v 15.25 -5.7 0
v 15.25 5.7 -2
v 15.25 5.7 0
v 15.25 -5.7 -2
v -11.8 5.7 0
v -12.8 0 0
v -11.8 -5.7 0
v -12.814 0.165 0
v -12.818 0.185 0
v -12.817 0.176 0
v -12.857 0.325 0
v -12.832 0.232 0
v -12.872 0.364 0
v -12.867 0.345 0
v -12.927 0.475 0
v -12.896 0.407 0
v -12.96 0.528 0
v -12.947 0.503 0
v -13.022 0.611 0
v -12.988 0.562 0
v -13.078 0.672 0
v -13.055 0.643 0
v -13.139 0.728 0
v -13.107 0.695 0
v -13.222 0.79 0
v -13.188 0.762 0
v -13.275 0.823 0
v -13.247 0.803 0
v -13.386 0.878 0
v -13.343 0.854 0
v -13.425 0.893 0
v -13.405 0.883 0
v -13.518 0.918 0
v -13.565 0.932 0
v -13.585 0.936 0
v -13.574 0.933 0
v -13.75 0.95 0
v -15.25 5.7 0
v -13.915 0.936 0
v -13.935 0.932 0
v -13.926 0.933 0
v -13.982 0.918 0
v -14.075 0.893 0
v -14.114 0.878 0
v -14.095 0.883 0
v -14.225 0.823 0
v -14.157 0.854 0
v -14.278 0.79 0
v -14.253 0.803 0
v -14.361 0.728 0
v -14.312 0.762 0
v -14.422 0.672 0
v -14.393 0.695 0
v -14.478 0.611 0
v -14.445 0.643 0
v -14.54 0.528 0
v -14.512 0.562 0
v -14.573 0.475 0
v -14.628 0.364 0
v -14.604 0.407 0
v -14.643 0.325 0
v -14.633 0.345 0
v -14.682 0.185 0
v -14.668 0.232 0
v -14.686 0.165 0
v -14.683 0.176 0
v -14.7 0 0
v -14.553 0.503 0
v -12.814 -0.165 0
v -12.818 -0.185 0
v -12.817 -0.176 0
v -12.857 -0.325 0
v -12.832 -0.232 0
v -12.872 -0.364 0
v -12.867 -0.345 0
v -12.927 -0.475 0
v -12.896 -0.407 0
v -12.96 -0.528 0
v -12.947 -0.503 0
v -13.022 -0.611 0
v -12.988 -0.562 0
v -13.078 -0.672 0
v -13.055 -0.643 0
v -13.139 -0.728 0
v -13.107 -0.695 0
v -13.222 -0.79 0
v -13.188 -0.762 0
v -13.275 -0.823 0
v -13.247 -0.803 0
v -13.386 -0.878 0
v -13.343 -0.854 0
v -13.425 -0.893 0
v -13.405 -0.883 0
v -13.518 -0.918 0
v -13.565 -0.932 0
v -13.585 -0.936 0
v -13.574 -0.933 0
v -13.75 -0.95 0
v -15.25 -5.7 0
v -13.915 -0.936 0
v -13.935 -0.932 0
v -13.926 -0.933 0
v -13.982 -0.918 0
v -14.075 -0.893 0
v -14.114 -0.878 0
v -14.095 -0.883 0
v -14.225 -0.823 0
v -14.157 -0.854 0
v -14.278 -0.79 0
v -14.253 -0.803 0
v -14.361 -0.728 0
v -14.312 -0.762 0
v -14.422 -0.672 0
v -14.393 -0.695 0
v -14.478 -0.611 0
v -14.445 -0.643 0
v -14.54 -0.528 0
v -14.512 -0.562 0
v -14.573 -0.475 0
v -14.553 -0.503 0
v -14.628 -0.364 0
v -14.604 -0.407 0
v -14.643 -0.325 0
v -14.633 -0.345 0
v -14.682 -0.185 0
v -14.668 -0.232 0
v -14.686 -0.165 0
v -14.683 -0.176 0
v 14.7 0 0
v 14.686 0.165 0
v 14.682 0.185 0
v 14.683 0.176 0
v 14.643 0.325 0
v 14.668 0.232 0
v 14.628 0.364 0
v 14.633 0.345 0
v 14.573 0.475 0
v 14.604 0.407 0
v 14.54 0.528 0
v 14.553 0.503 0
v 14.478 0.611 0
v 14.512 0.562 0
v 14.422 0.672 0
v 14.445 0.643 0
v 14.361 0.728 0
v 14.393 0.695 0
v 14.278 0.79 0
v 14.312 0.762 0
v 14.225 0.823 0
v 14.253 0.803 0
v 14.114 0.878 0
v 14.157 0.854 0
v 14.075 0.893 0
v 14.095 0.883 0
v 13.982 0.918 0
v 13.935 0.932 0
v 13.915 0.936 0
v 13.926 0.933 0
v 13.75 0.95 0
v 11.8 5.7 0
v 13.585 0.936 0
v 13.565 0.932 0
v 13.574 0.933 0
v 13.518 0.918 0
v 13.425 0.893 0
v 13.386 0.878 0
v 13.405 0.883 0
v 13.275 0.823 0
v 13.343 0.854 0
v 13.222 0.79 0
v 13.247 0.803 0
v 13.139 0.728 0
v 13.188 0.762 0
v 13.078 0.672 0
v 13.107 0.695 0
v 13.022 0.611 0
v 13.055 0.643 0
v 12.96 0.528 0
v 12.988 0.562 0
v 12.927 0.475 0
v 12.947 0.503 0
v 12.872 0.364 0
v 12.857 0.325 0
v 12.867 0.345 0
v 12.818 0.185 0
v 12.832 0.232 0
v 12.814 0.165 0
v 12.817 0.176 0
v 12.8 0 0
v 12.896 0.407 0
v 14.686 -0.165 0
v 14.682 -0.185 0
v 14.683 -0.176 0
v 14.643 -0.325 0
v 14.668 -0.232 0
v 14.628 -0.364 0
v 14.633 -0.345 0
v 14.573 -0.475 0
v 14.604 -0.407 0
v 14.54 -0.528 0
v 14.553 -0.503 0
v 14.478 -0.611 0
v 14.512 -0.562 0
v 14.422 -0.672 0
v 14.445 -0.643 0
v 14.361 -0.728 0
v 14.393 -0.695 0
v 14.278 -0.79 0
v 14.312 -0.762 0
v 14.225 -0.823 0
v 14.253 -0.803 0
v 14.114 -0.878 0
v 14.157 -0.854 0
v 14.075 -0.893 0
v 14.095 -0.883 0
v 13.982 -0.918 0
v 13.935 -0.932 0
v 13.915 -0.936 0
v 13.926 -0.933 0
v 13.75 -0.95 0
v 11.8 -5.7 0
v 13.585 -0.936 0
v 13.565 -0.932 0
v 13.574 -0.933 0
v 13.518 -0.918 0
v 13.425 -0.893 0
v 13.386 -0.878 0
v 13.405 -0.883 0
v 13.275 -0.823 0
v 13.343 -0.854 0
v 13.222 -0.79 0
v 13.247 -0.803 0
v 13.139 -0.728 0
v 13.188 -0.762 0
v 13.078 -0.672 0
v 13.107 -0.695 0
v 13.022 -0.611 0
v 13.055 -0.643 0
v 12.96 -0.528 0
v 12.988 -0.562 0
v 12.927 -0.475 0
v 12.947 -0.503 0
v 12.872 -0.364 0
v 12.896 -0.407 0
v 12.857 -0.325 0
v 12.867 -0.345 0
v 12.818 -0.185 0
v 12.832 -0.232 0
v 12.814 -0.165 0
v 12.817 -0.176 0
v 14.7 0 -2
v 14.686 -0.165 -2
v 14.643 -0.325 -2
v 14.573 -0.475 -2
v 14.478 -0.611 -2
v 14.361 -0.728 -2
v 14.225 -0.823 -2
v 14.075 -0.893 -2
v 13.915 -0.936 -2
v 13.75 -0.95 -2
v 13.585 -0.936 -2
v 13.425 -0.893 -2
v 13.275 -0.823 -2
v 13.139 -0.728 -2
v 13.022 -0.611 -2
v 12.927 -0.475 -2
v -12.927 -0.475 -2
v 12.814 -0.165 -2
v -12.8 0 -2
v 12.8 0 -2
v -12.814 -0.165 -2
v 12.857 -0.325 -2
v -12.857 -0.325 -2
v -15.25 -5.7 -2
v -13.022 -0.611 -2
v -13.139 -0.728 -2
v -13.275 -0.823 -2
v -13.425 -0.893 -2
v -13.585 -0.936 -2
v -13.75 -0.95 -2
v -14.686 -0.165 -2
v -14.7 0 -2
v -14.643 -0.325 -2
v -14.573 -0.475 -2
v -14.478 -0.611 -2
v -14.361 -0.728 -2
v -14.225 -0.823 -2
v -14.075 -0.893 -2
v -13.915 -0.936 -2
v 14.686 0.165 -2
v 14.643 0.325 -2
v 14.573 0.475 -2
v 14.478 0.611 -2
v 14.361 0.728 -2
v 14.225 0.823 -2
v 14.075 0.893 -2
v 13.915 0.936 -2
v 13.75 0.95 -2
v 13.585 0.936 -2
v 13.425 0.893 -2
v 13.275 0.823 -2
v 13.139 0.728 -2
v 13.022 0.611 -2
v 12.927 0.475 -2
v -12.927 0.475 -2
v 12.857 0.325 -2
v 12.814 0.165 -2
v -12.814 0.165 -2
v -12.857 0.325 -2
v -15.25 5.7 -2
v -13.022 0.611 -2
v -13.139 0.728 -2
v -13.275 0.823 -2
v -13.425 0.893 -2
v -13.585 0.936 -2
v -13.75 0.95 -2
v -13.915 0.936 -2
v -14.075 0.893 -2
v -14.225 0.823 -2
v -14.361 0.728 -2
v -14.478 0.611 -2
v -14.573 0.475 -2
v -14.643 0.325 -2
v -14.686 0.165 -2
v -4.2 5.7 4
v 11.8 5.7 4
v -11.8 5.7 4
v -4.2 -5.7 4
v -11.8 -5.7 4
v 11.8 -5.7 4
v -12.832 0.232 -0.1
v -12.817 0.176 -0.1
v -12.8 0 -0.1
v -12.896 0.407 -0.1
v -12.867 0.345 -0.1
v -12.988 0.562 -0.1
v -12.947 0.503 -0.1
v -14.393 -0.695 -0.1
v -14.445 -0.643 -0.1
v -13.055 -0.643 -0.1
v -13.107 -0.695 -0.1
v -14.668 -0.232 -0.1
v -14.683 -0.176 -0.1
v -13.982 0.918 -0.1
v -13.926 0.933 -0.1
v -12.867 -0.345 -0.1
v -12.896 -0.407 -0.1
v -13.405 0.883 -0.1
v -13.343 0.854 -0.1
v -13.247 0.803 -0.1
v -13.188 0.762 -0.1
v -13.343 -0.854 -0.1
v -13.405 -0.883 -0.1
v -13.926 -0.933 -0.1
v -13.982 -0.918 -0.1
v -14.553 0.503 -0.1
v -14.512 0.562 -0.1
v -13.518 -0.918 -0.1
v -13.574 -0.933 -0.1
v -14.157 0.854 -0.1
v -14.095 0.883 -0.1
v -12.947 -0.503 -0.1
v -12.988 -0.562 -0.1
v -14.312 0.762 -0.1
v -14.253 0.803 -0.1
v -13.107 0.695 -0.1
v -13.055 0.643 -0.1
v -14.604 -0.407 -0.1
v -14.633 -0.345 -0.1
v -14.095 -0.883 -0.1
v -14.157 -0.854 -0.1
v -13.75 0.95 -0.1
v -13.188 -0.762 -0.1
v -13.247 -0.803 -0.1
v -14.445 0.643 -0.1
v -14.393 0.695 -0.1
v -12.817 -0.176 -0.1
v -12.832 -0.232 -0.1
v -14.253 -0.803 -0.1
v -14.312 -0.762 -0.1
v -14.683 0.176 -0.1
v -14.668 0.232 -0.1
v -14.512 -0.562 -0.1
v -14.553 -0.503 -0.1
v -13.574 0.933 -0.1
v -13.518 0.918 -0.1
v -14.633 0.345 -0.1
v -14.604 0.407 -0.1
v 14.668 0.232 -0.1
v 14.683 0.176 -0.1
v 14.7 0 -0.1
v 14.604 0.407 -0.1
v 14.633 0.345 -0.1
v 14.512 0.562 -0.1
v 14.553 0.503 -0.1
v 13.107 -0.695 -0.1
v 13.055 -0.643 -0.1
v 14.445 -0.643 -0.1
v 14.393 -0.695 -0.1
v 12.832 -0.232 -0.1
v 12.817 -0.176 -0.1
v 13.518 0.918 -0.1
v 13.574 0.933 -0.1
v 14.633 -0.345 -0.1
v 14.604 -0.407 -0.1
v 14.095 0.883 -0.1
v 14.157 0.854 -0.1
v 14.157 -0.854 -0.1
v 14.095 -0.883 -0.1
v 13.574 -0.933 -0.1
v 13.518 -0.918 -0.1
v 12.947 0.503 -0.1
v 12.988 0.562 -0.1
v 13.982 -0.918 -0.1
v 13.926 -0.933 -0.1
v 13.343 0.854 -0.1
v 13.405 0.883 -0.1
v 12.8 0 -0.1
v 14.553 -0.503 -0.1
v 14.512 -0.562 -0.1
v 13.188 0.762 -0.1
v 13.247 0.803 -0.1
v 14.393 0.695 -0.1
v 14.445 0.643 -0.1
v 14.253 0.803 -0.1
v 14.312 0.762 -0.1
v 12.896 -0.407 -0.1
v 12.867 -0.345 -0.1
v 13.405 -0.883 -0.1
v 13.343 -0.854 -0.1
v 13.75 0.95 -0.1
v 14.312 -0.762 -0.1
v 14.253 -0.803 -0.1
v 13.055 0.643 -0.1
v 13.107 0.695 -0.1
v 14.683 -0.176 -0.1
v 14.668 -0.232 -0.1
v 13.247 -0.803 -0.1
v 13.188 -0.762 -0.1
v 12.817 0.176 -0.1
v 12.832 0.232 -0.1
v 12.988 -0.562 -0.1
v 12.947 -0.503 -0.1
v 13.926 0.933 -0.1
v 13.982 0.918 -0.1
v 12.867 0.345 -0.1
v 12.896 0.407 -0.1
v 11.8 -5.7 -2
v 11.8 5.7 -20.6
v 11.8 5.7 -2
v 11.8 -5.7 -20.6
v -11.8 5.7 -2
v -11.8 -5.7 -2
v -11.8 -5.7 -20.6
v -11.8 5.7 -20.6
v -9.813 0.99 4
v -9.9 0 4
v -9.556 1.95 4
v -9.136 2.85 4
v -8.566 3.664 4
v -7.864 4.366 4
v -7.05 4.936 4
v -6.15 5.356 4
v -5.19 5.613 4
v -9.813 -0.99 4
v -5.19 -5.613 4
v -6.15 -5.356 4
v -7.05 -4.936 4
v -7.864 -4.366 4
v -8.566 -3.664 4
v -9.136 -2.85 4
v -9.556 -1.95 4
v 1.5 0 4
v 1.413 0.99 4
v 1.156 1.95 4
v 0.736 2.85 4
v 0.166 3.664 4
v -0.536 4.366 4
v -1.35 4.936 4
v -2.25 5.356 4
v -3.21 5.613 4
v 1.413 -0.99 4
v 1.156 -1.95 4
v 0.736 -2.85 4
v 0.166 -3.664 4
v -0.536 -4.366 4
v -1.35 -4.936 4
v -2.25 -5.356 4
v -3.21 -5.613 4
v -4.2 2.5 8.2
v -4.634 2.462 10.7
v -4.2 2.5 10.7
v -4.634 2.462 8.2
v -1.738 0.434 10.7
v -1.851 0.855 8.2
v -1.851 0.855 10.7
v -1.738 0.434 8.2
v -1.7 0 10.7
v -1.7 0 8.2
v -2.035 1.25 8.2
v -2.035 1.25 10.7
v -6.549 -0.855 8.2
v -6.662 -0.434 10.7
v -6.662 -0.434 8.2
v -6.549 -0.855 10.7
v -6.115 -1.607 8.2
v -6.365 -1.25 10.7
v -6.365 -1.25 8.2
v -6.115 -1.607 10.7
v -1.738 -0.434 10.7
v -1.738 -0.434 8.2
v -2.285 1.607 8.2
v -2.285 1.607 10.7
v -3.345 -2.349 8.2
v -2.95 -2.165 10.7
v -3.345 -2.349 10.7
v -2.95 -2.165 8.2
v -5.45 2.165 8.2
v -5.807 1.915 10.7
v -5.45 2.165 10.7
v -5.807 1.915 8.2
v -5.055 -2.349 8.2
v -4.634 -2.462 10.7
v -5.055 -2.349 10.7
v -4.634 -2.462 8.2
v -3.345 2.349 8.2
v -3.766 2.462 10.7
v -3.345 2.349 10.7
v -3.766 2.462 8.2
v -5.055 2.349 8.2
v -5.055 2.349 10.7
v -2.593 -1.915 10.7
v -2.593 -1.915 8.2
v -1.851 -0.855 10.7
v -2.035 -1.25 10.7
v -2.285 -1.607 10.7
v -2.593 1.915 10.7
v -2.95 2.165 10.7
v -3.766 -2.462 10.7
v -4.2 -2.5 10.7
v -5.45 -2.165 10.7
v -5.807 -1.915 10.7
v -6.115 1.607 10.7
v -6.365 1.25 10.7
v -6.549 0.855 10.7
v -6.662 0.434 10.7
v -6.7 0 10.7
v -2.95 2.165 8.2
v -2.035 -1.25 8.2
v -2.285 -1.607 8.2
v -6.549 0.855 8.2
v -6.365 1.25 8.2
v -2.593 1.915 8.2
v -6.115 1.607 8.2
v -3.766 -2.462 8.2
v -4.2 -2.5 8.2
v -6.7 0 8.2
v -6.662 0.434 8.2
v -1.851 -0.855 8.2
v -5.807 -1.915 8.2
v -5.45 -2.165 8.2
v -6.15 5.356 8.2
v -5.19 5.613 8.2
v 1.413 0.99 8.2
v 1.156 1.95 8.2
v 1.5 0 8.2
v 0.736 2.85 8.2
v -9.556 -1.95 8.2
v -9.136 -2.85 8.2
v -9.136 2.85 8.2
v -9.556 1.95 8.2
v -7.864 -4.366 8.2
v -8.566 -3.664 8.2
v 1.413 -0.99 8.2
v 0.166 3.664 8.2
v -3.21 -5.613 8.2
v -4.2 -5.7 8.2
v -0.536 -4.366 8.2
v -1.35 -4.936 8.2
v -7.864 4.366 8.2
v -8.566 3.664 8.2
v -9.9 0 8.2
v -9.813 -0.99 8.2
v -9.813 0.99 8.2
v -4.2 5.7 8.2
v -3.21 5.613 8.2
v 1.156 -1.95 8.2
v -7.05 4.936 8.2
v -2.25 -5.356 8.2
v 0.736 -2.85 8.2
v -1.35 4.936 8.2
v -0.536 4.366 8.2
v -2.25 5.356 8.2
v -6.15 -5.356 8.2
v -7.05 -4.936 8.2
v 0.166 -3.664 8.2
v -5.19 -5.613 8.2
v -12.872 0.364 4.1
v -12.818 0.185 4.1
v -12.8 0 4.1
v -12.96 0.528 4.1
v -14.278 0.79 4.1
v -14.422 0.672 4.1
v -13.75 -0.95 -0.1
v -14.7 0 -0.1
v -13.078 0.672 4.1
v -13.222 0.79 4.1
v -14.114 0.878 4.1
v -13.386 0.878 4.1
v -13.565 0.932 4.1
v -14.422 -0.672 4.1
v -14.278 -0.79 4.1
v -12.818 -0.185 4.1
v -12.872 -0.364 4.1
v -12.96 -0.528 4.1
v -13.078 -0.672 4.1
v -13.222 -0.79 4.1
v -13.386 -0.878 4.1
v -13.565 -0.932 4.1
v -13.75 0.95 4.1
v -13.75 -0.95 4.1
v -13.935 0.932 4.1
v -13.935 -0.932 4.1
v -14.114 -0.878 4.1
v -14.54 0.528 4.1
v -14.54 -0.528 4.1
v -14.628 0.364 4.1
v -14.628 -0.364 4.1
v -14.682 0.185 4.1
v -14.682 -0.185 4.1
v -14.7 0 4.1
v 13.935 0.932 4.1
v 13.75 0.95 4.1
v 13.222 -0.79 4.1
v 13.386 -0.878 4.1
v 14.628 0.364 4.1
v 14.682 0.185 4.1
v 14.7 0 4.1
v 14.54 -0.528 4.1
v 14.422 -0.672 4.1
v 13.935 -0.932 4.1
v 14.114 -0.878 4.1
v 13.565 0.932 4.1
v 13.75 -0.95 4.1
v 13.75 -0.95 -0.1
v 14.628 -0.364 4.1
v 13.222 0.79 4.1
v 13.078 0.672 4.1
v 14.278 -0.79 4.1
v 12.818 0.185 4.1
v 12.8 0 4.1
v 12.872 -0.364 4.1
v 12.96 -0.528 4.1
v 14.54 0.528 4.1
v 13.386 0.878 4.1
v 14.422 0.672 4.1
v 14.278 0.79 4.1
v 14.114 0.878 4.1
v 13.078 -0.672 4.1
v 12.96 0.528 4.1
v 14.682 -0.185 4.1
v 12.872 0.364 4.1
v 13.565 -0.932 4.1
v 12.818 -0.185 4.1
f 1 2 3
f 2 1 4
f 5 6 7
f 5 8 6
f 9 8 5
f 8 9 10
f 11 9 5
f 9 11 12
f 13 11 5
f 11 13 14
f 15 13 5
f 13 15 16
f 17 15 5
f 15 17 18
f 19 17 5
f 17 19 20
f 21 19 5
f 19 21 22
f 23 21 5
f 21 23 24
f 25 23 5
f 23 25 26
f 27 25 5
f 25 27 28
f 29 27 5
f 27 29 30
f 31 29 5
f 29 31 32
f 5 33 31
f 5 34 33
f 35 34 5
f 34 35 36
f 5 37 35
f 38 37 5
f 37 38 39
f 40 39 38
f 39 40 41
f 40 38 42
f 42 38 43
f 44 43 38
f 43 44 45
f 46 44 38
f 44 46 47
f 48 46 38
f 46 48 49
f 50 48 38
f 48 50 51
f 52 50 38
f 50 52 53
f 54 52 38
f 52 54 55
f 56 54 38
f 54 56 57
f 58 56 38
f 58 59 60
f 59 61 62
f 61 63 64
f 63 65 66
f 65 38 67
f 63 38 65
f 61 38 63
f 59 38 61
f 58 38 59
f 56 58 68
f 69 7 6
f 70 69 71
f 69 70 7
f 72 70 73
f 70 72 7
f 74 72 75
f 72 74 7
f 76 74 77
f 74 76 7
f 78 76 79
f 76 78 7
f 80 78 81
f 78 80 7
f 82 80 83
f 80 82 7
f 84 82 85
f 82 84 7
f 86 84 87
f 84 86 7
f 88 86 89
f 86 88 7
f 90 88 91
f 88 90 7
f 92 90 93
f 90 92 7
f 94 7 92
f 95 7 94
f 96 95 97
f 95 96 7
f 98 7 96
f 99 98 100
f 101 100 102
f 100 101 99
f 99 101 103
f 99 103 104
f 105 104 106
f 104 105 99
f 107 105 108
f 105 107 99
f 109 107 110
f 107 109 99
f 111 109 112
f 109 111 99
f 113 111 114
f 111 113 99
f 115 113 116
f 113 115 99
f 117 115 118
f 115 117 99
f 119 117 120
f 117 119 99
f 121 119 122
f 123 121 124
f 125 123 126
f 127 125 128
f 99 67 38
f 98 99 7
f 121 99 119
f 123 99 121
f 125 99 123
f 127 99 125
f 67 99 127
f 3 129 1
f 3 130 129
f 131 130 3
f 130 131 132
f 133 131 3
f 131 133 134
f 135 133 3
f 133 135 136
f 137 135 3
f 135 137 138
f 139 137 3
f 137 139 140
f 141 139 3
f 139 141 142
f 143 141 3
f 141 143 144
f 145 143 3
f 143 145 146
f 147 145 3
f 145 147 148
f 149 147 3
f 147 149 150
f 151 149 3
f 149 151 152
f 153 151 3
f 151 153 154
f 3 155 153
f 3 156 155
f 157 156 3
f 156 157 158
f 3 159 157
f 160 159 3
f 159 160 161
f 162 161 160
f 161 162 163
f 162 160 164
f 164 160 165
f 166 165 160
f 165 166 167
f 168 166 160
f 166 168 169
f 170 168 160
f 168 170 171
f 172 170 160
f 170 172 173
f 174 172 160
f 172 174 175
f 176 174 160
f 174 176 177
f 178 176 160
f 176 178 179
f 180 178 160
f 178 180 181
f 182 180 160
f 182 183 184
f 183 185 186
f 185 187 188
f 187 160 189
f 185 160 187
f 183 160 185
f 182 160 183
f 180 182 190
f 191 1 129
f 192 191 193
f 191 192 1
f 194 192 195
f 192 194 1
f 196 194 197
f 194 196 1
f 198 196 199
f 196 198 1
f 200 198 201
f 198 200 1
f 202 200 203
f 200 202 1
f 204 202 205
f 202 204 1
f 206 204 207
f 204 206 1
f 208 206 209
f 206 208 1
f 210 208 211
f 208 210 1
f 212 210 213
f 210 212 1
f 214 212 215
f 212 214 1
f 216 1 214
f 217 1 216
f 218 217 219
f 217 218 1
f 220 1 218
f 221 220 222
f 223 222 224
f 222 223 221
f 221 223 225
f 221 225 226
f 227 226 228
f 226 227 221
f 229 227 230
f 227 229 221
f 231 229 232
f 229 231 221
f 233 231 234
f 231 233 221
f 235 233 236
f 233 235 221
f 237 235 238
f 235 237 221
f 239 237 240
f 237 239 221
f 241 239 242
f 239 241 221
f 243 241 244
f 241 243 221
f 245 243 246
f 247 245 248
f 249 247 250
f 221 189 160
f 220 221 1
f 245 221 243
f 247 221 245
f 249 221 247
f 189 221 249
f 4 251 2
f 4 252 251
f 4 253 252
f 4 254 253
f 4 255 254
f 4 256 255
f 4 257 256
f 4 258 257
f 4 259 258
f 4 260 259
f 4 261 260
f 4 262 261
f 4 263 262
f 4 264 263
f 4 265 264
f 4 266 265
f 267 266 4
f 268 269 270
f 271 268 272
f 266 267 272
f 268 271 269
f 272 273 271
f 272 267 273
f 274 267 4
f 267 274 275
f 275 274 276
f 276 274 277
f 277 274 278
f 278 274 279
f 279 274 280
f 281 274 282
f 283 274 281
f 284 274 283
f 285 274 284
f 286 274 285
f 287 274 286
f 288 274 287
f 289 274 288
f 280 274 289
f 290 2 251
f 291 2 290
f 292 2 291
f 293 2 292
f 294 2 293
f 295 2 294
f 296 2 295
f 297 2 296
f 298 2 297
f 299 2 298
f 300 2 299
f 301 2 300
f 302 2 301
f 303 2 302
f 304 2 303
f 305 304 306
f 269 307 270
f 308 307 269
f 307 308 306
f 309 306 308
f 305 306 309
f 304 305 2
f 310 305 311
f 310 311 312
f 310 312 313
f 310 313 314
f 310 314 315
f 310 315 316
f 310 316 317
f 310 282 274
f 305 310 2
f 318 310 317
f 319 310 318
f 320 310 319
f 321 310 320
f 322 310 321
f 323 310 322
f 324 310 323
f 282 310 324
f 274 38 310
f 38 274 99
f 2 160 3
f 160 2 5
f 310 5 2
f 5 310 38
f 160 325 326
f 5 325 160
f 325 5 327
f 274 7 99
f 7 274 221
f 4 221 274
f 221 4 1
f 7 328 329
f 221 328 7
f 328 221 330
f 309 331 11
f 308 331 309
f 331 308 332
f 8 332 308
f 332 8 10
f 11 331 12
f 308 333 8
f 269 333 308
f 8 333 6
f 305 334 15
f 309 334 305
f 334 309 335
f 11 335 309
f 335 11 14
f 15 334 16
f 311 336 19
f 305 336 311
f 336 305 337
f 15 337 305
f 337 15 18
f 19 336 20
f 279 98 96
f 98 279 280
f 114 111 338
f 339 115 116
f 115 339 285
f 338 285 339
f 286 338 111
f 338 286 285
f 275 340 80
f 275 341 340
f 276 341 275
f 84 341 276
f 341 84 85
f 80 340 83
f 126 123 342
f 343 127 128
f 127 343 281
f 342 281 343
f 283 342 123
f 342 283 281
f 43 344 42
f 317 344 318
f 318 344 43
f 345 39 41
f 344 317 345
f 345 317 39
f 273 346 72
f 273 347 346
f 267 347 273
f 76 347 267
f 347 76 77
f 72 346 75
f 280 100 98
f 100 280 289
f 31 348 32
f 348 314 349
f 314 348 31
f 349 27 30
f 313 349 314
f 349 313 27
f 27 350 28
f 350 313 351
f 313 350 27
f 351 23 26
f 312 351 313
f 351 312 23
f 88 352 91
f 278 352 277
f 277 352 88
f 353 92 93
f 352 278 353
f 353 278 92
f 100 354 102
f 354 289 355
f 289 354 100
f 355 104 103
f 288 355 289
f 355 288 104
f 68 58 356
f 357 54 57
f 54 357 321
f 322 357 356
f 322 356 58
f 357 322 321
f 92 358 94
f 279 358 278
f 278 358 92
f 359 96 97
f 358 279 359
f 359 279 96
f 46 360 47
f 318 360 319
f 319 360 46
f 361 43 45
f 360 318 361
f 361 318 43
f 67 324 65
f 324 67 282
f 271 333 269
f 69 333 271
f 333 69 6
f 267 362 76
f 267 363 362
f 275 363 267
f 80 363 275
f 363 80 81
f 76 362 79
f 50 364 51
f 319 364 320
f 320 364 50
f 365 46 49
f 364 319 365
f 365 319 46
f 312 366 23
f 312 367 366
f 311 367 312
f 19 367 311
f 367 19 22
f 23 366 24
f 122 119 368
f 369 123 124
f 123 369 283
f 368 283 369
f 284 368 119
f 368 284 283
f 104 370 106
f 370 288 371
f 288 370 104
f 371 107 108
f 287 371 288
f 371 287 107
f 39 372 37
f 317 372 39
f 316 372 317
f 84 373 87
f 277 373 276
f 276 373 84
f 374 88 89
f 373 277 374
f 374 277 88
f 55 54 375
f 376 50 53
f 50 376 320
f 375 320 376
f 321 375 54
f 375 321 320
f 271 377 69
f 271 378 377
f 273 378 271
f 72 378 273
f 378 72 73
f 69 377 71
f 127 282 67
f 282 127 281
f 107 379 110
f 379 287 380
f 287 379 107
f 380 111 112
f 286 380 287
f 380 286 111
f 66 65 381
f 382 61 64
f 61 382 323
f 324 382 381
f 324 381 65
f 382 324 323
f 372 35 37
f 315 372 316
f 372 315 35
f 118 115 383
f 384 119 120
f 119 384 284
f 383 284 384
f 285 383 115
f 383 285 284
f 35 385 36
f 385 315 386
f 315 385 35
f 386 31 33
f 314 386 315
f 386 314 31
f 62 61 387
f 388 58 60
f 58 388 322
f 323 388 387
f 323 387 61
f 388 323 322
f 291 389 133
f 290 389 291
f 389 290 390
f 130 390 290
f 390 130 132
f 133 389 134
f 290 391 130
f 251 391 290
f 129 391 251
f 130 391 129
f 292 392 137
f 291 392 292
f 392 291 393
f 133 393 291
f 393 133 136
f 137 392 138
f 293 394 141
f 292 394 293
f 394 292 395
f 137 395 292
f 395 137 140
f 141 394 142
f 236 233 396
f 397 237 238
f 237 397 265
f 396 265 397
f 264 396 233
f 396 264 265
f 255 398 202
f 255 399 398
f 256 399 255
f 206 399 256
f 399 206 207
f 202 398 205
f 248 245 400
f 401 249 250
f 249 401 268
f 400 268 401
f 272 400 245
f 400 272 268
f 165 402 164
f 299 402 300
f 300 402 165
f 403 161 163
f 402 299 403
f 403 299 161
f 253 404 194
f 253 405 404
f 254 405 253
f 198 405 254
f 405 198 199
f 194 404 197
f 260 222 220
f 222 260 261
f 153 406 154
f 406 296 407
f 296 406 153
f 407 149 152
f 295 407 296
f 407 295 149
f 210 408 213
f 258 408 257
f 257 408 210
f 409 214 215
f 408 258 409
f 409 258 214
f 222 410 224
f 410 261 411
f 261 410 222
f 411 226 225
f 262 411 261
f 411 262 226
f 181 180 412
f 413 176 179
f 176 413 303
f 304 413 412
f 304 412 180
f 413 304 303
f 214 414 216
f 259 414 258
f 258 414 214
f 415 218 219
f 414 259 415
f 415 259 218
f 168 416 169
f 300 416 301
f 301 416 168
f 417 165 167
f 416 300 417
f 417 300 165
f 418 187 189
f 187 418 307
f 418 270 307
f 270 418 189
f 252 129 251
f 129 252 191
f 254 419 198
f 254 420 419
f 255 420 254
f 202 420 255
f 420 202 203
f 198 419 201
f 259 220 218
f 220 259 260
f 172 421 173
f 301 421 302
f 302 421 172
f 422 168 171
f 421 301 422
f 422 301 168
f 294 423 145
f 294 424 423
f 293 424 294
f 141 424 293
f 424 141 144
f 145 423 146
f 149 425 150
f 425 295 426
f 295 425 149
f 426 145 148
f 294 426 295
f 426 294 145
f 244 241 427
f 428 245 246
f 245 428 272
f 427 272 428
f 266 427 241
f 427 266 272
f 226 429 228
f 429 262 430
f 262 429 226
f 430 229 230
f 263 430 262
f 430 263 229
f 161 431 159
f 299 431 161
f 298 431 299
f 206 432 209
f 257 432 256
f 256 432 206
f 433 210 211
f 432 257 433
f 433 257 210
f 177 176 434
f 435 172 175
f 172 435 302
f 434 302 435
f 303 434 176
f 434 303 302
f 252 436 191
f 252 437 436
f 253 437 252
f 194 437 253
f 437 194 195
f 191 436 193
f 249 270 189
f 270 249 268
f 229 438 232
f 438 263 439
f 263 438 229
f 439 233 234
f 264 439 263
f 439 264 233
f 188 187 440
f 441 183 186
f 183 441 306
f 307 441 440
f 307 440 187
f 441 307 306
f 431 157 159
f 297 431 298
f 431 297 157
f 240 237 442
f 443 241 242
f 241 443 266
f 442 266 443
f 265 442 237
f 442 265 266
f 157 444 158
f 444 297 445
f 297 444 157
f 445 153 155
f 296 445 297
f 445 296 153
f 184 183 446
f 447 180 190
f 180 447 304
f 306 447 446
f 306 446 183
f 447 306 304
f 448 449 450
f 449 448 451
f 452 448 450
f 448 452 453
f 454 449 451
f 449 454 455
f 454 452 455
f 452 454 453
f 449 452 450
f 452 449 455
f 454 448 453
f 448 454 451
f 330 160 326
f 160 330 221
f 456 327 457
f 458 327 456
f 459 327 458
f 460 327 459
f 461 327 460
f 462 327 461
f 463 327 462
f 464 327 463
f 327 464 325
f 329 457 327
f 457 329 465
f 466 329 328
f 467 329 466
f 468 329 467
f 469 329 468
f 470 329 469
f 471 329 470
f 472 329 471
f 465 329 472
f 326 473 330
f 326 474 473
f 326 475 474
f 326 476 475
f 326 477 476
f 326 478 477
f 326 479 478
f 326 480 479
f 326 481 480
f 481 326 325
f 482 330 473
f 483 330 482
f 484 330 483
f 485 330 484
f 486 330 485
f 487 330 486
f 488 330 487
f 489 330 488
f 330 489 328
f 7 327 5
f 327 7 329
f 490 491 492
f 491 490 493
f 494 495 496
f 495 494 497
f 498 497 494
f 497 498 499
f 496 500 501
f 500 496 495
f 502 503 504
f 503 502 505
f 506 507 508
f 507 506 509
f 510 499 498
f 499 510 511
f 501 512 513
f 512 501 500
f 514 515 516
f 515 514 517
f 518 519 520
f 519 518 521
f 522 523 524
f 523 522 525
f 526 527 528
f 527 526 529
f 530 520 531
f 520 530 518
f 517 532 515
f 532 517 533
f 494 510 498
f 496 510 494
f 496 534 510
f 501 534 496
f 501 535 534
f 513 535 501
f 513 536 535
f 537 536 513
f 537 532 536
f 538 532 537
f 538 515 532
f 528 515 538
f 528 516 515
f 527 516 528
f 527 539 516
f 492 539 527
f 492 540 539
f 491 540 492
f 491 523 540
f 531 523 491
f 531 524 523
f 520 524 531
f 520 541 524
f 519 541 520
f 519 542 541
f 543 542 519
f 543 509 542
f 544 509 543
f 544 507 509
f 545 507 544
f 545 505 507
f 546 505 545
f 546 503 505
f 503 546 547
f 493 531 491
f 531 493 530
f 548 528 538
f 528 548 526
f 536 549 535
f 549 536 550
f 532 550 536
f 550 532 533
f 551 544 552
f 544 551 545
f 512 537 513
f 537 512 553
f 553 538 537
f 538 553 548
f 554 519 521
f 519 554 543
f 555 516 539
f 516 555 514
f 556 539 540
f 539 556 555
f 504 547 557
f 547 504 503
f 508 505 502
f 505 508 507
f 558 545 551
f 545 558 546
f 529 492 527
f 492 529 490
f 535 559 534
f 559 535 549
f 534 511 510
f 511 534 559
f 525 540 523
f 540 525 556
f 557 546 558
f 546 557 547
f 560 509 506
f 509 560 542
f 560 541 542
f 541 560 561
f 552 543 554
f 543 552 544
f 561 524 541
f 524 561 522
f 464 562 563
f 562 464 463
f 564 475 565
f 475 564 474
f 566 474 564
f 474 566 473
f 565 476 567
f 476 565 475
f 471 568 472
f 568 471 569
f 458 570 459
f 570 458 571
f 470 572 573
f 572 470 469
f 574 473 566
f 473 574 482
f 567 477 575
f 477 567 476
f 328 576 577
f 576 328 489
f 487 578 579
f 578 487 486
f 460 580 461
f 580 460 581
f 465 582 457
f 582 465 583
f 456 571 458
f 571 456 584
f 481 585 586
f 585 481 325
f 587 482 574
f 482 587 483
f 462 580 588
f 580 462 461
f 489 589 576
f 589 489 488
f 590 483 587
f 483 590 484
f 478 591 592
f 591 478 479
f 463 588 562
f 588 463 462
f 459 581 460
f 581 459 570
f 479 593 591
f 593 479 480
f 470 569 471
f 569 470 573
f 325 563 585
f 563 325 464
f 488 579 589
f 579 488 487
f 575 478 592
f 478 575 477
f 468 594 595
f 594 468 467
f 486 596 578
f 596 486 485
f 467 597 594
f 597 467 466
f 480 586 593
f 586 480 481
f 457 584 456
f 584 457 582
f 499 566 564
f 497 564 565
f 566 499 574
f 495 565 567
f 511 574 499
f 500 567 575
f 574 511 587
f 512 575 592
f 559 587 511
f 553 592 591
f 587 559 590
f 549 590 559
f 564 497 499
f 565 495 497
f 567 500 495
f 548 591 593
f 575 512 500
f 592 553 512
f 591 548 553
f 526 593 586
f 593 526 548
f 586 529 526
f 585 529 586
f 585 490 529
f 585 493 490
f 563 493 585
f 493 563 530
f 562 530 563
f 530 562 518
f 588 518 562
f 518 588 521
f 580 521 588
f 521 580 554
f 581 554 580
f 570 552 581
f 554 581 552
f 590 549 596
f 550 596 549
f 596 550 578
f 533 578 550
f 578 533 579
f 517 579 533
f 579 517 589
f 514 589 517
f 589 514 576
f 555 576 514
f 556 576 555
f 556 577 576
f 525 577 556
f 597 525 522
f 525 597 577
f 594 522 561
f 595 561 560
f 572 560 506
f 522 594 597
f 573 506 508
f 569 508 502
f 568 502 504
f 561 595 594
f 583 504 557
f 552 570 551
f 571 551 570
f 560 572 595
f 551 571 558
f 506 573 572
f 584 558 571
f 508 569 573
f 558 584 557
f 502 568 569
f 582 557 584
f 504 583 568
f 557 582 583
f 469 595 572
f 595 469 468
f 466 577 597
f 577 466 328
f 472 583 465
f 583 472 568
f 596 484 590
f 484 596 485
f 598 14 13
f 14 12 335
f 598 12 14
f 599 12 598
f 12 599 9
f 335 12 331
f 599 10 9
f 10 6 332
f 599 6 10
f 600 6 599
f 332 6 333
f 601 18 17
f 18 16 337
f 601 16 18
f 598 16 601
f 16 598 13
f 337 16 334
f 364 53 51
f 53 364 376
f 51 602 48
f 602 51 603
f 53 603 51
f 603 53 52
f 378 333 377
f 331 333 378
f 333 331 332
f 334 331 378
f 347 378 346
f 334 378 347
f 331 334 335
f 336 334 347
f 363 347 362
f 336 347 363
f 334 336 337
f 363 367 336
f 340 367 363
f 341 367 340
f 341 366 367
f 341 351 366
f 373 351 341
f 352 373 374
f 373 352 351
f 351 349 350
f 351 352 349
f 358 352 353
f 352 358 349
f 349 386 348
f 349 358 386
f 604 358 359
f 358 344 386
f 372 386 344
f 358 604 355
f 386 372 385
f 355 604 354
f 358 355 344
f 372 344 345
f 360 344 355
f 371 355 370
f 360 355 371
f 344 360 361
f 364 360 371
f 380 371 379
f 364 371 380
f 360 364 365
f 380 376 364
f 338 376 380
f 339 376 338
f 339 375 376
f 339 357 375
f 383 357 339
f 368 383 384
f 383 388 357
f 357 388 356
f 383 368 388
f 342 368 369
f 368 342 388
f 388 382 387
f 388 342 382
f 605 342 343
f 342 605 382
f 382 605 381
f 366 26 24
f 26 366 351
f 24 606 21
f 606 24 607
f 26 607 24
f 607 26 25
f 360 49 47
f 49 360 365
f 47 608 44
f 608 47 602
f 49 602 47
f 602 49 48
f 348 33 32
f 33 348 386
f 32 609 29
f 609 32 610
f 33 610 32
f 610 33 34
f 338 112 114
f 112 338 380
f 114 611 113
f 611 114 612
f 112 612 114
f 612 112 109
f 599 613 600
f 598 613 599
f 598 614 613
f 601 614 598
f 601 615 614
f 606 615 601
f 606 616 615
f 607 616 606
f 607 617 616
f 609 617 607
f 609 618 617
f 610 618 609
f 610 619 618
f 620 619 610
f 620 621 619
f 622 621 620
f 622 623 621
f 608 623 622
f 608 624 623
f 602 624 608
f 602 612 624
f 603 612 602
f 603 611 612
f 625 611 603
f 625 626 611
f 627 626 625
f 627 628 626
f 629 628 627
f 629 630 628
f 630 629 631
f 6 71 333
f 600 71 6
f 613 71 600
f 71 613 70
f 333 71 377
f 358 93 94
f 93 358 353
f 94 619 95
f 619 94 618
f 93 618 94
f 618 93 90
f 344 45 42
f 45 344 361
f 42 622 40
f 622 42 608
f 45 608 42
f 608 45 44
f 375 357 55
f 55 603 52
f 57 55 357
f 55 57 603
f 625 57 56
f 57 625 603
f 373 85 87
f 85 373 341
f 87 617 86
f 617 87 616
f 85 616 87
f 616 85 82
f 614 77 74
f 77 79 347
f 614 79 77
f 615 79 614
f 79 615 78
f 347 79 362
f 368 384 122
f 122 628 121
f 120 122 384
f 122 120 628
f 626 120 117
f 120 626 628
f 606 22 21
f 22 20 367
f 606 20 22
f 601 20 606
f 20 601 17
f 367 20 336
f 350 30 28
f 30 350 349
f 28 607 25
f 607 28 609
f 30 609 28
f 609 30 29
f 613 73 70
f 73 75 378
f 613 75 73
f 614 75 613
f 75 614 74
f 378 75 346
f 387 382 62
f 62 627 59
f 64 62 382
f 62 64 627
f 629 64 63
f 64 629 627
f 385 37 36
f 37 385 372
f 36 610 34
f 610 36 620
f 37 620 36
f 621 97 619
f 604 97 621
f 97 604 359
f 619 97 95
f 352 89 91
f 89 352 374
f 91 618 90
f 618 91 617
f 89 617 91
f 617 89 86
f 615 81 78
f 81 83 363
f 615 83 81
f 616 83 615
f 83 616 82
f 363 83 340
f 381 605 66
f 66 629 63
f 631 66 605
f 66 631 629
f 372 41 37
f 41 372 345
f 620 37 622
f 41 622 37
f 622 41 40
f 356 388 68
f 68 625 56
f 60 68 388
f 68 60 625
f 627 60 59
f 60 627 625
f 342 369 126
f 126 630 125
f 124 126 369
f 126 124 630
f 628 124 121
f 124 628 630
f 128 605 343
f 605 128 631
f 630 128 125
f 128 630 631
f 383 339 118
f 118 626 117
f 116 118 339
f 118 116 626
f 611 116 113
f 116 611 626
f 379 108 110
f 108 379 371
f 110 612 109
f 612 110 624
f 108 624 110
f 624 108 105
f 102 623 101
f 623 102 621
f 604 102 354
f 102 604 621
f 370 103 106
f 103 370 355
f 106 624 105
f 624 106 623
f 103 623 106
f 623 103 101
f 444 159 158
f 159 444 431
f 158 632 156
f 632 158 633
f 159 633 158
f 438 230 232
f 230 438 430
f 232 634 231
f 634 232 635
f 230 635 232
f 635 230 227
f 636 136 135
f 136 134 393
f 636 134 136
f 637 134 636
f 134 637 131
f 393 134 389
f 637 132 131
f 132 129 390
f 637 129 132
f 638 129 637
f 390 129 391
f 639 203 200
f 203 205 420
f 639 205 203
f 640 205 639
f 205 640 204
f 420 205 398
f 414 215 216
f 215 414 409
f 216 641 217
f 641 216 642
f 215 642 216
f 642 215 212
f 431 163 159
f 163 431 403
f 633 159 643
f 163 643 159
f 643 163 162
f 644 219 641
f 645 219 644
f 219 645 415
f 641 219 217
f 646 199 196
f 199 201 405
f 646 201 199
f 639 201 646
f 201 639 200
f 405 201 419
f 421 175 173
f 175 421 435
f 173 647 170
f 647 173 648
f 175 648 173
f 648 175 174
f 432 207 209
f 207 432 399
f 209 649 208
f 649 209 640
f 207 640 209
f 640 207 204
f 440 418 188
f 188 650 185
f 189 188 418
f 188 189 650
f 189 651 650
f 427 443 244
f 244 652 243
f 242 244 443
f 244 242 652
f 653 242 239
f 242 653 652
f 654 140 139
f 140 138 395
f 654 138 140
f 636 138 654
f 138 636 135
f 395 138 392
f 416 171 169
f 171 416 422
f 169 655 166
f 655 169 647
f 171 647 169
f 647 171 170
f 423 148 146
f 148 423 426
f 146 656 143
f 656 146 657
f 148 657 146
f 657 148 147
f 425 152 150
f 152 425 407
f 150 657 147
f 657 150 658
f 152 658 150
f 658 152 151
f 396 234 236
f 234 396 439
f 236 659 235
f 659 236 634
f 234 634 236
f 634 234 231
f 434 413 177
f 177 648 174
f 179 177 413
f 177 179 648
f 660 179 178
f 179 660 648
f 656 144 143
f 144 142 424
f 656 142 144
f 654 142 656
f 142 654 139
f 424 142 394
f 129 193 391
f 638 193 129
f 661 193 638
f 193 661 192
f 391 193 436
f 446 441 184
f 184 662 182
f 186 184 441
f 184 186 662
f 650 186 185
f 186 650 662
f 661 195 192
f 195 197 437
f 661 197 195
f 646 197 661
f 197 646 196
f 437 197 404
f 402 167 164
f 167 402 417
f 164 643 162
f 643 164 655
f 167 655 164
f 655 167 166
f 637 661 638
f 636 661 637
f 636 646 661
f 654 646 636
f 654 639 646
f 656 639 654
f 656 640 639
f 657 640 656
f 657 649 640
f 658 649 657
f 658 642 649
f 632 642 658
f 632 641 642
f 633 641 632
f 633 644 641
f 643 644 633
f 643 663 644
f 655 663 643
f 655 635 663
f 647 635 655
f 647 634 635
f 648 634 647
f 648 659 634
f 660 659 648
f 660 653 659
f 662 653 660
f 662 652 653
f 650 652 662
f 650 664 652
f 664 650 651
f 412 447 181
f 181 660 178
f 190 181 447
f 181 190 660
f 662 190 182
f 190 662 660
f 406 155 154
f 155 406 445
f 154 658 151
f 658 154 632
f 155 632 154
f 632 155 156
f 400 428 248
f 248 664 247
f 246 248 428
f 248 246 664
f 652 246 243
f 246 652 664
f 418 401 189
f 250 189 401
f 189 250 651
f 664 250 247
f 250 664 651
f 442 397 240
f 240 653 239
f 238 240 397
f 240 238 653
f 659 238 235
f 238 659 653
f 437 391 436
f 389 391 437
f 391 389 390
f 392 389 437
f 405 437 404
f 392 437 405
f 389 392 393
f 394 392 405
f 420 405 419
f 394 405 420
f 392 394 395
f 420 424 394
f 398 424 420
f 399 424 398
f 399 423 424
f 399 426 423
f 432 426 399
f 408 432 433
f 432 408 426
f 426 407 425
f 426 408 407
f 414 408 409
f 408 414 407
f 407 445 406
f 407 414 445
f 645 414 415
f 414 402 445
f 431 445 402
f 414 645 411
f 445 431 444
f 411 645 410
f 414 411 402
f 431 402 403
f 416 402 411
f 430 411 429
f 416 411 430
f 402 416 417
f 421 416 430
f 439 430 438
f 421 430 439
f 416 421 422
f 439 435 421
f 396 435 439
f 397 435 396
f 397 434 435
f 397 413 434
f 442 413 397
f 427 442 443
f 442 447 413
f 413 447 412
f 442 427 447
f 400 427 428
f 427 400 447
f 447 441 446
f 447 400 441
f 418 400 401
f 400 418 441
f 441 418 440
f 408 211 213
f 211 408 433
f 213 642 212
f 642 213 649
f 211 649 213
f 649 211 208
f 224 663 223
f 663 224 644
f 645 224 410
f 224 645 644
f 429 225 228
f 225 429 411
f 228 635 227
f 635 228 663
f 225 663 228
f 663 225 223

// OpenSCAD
// mg90S_body.scad
// a mg90S model without rotor
//
// Source: https://components101.com/sites/default/files/component_datasheet/MG90S-Datasheet.pdf
// https://sellseatar.xyz/product_details/50064365.html
// mg90S_dimesions.jpg

$fn=32;

//dimensions of parts
// overall body
m_dim = [23.6,11.4,30.5];
// lower part
l_dim = [m_dim.x,m_dim.y,18.6];
// holder with screws
h_dim = [30.5,m_dim.y,2];
// upper part
u_dim = [m_dim.x,m_dim.y,4];
// gear
g_dim = [5/2,5,7.6]; // from mg90s_rotor.scad
// plate on upper part
r_dim = [11.4,5,g_dim.z];
// screws on holder
s_dim = [1.9/2,2.1*h_dim.z,g_dim.z];
// position of screws on holder
t_dim = [1.5,m_dim.y/2,h_dim.z];

// positions of the screws
function mg90s_holder_hole_pos() = [
[-(h_dim.x/2-t_dim.x),-(h_dim.y/2-t_dim.y),h_dim.z],
[h_dim.x/2-t_dim.x,h_dim.y/2-t_dim.y,h_dim.z]
];

// draws a screw (cutout) for the holder
module mg90s_holder_screw(h=s_dim.y) {
  cylinder(r=s_dim.x,h=h,center=true);
}
// draw the body
module mg90s_body($fn=36) {
    // lower part
    color ("DarkGrey") 
    cube(l_dim);
    // holder
    translate([(l_dim.x-h_dim.x)/2,0,l_dim.z])
    color ("DarkGrey") difference(){
    cube(h_dim);
    translate([t_dim.x,t_dim.y,h_dim.z])
    cylinder(r=s_dim.x,h=s_dim.y,center=true);
    translate([h_dim.x-t_dim.x,h_dim.y-t_dim.y,h_dim.z])
    cylinder(r=s_dim.x,h=s_dim.y,center=true);
    }
    // upper part
    translate([0,0,l_dim.z+h_dim.z])
    color ("DarkGrey") 
    cube(u_dim);
    // gear
    translate([g_dim.z,l_dim.y/2,m_dim.z-1.7])
    color ("Gold") 
    cylinder(r=g_dim.x,h=g_dim.y,center=true); 
    translate([r_dim.z,l_dim.y/2,m_dim.z-1.7-r_dim.y/2])
    color ("DarkGrey")
    cylinder(d=r_dim.x,h=r_dim.y,center=true);
}

*mg90s_body();

// moves the body : top of the gear is [0,0,0]
function mg90s_to_gear() = 
    -[g_dim.z,l_dim.y/2,m_dim.z];

*translate(mg90s_to_gear()) mg90s_body();

// moves the body : center of holder is [0,0,0]
function mg90s_to_holder() = 
    -[l_dim.x/2,l_dim.y/2,h_dim.z+l_dim.z];
function mg90s_gear_to_holder() = 
    [0,0,g_dim.y+ u_dim.z-h_dim.z];

translate(mg90s_to_holder()) mg90s_body();

pos = mg90s_holder_hole_pos();
translate(pos[0]) mg90s_holder_screw();
translate(pos[1]) mg90s_holder_screw();
